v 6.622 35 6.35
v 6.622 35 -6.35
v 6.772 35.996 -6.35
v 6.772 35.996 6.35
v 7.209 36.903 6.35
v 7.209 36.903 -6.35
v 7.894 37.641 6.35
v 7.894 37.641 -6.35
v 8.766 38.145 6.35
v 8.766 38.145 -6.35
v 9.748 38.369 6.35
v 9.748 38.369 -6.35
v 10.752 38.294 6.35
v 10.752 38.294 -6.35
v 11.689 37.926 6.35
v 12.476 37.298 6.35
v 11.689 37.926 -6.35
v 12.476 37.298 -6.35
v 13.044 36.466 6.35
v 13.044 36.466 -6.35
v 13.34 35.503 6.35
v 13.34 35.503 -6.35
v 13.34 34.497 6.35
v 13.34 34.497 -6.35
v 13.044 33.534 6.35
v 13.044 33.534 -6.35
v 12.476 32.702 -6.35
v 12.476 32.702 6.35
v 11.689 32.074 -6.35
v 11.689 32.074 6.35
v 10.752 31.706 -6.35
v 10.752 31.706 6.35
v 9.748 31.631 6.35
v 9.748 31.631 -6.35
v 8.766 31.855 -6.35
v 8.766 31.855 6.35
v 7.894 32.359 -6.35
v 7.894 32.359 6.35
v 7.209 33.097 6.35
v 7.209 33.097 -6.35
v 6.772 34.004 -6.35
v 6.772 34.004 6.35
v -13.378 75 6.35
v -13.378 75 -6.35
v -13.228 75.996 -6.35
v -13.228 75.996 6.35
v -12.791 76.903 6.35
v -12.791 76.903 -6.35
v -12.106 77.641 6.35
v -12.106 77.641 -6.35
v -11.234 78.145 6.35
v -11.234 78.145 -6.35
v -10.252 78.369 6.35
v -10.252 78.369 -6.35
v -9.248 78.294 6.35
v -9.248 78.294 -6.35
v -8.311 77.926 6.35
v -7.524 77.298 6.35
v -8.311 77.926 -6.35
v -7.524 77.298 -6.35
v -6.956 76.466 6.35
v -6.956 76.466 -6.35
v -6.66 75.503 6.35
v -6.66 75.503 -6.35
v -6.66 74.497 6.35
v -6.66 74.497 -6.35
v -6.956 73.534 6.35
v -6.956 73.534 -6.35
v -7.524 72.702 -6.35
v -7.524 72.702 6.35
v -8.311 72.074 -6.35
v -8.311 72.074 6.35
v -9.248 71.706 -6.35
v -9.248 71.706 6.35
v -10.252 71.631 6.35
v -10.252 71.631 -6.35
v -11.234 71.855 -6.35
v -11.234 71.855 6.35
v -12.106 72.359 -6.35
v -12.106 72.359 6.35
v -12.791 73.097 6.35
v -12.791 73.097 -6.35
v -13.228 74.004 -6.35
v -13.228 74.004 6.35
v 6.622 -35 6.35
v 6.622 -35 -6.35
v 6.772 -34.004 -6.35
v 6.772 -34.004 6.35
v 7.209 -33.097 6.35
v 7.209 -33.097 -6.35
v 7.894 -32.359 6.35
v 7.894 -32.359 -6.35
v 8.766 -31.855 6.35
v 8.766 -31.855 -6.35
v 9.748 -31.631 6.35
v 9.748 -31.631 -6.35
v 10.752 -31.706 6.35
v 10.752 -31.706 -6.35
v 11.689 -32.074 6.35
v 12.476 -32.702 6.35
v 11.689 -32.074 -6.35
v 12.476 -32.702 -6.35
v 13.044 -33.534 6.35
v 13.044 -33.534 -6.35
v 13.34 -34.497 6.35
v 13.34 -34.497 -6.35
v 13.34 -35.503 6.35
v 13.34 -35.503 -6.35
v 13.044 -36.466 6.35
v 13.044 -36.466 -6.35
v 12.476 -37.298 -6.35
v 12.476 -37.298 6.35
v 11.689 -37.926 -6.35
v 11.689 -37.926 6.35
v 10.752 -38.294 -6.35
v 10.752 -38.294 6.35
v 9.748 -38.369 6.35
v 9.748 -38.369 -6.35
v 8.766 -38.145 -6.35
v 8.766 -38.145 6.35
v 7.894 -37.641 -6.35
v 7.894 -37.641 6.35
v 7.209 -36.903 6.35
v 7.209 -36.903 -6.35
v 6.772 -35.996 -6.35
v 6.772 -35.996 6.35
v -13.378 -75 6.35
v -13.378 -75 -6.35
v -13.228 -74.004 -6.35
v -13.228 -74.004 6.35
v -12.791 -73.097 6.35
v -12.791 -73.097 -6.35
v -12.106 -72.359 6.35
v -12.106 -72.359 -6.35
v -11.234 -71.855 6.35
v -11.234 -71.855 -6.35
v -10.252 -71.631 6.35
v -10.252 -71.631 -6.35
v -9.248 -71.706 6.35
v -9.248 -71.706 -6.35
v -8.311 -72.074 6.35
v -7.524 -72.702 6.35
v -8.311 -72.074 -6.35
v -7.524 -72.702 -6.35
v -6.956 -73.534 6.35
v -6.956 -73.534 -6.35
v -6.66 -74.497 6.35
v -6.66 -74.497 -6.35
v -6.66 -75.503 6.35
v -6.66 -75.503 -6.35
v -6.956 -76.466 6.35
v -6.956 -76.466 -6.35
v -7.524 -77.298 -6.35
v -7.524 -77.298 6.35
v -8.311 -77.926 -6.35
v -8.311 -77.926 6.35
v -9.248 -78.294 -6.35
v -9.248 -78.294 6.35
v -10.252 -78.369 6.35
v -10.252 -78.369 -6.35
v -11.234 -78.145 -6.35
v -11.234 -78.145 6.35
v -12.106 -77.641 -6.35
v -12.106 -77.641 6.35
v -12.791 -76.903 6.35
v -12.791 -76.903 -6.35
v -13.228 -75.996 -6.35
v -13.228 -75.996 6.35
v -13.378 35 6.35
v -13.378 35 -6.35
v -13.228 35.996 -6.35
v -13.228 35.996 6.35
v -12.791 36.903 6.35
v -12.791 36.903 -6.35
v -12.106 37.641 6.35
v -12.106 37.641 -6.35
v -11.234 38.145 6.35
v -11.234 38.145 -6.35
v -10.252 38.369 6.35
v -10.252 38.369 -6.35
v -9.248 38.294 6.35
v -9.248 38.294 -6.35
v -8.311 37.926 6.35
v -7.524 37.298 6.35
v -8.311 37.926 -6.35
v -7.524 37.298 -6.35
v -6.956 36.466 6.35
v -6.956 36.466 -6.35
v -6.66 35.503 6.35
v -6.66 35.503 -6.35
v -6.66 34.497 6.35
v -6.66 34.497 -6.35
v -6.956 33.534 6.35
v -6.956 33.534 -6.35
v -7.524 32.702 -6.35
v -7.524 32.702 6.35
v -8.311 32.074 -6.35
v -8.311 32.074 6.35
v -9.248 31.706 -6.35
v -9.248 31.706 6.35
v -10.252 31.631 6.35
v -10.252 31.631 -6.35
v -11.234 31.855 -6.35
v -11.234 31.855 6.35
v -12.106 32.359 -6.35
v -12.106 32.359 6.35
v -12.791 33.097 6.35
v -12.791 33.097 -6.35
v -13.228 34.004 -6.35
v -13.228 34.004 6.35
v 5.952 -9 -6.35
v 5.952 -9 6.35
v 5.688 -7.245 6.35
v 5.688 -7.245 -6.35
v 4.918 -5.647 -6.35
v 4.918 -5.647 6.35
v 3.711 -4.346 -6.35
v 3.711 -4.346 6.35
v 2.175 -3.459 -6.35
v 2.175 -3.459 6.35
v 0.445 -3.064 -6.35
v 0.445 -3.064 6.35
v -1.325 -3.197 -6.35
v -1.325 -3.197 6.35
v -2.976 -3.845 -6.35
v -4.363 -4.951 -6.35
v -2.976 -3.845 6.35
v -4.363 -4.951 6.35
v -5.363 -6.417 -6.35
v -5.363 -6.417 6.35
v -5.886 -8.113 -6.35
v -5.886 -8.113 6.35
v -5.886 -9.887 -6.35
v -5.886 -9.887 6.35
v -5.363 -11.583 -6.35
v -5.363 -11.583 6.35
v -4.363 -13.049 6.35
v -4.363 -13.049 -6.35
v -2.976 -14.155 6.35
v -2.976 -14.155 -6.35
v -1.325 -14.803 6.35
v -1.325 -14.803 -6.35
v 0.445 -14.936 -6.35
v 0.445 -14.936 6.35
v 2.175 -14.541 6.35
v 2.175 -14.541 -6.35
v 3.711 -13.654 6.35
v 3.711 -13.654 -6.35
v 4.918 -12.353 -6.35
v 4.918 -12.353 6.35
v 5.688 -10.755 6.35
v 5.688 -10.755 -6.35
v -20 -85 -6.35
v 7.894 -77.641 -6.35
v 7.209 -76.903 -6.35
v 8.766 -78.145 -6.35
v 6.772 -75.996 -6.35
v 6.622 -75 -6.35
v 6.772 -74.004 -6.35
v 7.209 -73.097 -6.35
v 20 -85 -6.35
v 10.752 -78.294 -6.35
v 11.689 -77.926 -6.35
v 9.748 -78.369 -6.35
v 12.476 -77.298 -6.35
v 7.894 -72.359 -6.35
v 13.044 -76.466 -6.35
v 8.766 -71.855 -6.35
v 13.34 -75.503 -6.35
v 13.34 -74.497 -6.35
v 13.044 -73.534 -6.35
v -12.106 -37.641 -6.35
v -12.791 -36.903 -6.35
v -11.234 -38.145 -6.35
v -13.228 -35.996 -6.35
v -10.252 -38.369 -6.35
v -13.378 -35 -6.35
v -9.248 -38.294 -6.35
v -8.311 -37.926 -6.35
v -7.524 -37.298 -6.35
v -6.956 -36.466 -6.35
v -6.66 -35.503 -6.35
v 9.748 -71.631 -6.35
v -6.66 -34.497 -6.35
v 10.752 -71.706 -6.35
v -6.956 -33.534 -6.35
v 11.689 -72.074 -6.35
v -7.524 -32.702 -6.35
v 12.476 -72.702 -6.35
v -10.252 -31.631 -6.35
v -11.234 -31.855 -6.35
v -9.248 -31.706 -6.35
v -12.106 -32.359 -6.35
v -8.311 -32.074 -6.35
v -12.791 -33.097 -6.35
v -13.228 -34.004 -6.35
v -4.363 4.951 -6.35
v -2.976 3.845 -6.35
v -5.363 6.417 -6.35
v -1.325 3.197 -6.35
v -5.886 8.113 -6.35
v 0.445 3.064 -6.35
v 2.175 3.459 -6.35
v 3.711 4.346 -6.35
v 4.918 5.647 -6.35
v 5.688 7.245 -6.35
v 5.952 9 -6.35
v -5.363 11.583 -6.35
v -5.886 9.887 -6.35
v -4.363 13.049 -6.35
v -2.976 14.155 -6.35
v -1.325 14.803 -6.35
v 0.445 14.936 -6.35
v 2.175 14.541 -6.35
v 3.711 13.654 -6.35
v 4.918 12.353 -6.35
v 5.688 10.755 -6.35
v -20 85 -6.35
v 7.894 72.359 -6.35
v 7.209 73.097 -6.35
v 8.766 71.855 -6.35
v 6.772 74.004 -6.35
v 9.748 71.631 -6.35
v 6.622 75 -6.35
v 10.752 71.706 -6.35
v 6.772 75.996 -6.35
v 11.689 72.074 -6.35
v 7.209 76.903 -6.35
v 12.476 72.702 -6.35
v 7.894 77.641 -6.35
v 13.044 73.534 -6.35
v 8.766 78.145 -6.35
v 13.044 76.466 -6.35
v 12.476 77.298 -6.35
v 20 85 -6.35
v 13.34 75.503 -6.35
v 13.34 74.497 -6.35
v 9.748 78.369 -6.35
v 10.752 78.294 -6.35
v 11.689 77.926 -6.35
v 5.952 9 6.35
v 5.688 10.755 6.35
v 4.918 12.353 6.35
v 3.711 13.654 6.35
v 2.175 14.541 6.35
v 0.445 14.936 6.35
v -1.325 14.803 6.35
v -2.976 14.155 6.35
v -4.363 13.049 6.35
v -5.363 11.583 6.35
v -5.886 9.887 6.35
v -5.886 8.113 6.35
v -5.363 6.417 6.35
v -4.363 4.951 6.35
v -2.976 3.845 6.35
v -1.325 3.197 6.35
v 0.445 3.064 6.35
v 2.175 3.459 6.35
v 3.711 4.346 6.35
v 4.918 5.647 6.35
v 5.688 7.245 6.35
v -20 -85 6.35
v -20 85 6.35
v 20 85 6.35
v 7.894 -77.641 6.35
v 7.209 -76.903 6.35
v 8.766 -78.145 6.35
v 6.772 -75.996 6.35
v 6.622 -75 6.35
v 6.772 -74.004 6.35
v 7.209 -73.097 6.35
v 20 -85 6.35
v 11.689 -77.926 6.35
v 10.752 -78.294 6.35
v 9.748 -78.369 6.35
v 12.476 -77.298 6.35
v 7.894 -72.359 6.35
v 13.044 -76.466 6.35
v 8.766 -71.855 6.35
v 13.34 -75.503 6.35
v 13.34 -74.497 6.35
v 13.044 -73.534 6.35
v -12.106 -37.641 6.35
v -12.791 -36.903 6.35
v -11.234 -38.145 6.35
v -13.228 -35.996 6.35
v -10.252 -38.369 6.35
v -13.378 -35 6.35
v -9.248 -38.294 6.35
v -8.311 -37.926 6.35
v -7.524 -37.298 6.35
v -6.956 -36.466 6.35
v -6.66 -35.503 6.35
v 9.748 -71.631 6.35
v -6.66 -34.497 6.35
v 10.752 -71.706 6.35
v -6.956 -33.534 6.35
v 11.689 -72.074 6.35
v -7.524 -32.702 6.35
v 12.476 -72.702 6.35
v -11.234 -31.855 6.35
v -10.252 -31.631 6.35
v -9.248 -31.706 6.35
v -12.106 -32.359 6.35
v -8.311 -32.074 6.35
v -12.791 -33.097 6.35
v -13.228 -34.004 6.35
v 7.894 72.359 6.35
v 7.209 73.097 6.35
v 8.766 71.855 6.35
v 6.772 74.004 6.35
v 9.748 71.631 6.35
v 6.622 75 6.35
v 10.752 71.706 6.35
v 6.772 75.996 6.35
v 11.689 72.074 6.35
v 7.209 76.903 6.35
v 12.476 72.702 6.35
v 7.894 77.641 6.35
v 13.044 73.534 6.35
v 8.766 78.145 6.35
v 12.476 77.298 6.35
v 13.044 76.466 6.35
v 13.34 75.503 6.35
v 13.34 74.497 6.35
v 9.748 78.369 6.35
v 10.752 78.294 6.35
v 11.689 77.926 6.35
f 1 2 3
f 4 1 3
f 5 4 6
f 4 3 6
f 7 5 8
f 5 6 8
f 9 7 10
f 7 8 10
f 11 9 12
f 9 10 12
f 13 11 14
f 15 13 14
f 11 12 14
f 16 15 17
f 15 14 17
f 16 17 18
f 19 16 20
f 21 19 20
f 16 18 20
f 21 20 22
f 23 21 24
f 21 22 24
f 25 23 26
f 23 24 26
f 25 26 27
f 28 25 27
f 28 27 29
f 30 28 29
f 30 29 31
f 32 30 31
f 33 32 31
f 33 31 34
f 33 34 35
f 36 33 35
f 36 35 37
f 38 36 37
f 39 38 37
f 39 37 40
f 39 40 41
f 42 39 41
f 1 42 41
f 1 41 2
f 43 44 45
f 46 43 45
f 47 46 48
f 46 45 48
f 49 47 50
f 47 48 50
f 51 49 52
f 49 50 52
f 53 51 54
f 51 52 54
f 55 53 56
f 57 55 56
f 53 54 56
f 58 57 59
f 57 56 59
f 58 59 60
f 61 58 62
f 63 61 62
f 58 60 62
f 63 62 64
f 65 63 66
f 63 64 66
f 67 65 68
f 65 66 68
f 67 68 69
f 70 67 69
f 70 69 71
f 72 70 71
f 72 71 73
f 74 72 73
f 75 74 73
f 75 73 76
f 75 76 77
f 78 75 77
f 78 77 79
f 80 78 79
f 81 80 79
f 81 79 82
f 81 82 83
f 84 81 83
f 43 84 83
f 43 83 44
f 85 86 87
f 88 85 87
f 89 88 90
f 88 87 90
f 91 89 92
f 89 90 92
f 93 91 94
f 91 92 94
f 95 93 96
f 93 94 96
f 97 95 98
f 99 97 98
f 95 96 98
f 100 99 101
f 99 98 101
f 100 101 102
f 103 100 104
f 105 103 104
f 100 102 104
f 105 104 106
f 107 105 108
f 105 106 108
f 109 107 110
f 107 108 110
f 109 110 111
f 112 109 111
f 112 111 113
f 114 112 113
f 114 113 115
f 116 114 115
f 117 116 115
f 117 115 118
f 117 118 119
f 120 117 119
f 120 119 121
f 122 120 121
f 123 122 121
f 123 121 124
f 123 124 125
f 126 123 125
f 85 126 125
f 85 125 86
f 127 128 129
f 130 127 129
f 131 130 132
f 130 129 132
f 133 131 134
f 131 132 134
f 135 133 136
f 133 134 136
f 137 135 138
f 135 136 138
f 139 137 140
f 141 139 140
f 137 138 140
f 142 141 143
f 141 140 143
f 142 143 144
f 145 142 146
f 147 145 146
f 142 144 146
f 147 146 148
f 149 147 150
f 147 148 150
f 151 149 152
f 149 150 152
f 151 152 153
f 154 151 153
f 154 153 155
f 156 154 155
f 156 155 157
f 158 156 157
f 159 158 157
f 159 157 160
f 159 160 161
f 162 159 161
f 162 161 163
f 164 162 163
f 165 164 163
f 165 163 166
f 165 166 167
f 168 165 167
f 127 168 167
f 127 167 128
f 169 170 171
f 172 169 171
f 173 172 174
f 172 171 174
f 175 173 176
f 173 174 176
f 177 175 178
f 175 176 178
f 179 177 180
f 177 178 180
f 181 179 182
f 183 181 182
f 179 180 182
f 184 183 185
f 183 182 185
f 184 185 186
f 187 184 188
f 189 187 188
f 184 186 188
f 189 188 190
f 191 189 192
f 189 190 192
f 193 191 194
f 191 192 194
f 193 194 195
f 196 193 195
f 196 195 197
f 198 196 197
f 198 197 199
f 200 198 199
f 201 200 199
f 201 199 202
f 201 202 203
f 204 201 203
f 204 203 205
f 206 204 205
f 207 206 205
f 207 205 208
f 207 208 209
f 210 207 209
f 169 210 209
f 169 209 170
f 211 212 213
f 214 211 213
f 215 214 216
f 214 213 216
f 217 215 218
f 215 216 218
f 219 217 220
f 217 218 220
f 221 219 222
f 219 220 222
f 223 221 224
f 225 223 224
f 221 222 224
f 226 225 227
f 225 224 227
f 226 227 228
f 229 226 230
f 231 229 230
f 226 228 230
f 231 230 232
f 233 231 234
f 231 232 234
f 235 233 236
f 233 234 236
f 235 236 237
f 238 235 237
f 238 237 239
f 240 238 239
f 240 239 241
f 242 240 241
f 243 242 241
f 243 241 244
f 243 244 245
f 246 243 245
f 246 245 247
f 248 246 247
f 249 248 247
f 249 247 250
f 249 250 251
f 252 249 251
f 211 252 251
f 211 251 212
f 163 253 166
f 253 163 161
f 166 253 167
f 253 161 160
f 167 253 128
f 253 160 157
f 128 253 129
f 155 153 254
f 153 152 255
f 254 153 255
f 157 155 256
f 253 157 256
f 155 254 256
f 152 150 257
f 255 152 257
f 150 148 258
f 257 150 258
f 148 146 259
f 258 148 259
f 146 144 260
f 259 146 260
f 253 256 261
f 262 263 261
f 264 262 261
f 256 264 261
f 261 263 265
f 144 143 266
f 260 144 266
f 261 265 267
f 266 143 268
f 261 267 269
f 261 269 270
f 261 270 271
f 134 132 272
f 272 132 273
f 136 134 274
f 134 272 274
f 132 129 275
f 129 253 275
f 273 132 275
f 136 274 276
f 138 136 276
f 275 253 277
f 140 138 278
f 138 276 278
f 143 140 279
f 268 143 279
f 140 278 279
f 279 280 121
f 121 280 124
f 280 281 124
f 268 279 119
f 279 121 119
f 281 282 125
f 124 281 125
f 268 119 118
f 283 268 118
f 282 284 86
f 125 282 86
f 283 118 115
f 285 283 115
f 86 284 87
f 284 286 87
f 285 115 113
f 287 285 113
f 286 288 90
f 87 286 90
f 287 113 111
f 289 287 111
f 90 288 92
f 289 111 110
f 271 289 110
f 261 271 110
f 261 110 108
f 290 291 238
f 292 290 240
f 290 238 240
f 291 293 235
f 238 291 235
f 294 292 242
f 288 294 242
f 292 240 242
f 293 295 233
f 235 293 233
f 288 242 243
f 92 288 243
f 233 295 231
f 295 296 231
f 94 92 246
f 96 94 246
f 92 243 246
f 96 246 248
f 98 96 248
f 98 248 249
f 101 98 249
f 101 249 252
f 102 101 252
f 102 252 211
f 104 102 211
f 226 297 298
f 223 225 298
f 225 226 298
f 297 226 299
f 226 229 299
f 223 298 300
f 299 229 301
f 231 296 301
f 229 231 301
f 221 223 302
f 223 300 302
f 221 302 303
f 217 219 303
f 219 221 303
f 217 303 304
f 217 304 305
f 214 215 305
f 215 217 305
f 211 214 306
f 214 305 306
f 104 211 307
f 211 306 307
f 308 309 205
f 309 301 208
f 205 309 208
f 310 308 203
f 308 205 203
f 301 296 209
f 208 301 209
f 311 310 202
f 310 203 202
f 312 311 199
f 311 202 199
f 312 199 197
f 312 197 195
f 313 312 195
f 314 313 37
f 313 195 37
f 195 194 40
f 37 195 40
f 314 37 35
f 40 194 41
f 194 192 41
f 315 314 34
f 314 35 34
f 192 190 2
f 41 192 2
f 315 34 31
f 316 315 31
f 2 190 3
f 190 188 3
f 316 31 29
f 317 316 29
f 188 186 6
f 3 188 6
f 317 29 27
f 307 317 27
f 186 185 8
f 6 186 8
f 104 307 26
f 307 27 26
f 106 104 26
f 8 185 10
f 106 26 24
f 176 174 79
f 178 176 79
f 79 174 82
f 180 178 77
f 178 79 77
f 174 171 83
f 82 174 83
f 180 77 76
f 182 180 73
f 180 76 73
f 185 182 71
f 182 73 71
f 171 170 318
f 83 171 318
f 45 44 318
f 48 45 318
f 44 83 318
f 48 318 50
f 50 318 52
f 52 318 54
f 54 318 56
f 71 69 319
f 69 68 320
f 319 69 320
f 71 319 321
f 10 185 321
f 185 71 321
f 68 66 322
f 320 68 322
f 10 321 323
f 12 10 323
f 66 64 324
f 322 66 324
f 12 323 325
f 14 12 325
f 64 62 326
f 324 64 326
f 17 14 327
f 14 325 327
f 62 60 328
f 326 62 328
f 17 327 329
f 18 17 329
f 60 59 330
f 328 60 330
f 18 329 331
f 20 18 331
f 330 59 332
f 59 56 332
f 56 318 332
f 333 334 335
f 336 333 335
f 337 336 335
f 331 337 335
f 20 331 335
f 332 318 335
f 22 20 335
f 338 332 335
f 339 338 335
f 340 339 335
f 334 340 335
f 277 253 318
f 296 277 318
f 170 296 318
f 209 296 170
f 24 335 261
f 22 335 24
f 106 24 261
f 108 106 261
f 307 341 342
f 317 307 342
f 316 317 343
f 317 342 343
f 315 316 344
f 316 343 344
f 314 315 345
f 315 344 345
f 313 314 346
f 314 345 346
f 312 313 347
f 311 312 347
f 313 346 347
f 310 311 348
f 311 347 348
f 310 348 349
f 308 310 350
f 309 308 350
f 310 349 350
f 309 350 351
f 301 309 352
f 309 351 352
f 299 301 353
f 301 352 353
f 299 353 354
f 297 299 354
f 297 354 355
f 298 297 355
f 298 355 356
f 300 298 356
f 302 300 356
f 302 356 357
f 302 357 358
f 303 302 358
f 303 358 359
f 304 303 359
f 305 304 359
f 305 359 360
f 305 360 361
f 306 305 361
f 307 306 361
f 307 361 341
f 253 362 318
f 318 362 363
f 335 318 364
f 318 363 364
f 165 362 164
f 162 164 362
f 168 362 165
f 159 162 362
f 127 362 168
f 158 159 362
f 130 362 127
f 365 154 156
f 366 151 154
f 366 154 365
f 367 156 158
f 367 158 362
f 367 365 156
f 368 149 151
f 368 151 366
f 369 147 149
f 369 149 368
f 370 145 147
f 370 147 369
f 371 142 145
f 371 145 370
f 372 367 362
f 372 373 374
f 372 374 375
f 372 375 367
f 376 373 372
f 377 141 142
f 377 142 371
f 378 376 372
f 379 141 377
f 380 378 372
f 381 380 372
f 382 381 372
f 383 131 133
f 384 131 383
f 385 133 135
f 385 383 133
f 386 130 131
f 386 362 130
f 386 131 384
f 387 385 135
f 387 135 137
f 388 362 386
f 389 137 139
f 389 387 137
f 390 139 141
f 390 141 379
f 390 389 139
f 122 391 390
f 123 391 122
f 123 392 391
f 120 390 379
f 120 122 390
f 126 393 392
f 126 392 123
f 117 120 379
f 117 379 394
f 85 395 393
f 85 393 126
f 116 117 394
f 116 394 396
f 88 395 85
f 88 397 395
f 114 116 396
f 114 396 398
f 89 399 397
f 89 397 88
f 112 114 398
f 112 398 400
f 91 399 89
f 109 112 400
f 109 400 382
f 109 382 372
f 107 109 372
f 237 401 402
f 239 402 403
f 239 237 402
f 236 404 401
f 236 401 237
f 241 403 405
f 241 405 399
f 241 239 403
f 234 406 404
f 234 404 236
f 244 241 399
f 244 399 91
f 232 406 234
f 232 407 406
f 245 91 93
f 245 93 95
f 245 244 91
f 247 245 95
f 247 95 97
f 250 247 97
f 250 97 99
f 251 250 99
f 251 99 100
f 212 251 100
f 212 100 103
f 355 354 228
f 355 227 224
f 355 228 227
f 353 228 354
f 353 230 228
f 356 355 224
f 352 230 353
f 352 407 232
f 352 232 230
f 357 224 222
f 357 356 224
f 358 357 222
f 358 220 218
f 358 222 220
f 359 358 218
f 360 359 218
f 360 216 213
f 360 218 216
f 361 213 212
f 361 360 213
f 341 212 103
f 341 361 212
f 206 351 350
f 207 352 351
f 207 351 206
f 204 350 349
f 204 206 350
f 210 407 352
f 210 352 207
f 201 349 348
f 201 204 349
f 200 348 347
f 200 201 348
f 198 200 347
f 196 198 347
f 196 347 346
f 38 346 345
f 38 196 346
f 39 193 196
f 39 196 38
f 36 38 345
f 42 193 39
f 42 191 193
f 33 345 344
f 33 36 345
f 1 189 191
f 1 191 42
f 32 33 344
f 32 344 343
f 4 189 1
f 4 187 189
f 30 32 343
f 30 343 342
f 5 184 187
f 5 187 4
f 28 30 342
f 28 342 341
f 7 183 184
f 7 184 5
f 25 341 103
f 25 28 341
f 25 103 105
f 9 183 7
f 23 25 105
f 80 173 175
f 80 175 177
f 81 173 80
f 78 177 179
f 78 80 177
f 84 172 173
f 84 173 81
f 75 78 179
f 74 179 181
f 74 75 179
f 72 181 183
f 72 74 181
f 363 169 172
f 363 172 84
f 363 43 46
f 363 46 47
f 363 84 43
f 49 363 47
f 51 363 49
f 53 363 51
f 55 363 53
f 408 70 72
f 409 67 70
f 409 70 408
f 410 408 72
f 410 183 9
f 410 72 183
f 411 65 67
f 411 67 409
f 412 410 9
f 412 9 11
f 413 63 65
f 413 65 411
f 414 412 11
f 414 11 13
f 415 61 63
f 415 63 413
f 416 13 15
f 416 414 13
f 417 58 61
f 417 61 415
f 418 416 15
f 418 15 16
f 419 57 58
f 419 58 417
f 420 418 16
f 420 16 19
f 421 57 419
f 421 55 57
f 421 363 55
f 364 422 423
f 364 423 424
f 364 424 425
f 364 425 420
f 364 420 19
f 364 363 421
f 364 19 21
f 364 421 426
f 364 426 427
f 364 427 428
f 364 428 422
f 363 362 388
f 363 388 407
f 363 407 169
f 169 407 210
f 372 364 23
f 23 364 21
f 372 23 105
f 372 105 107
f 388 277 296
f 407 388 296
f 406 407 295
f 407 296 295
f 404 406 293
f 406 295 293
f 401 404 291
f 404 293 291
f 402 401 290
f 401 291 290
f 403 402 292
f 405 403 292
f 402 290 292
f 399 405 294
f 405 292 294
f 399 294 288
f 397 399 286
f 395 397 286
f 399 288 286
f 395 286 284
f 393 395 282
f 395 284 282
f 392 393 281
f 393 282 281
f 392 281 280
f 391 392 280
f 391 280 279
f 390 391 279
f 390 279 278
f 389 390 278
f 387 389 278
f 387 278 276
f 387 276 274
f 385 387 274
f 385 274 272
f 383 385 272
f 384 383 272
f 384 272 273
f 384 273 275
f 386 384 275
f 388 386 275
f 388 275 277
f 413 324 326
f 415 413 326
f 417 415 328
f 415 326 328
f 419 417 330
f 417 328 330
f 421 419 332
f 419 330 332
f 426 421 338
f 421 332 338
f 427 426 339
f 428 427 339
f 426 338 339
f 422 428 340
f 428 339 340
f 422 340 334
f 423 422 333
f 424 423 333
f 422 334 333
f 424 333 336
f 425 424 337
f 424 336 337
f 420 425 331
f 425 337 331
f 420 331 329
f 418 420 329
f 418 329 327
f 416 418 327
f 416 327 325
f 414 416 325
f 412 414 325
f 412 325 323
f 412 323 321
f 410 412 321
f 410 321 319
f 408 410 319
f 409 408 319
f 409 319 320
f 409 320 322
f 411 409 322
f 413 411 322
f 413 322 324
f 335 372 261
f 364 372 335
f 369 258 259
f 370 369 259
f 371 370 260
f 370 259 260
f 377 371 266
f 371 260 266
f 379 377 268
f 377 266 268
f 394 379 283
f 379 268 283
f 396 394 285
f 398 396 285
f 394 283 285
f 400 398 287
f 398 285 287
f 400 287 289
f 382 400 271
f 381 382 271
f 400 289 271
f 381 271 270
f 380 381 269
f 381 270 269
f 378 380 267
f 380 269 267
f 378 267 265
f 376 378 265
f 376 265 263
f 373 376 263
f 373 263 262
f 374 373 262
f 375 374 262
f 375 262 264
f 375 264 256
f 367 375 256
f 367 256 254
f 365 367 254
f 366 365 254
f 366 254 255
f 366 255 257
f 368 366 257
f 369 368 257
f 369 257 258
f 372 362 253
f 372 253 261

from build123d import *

# Parameters (mm, degrees)
CROQUIS1_W                     = 40
CROQUIS1_H                     = 170
SALIENTE_EXTRUIR1_DEPTH        = 6.35
TALADRO_DE_MARGEN_PARA_1_41_D  = 6.7564
TALADRO_DE_MARGEN_PARA_7_161_D = 11.90498


with BuildPart() as part:
    # Croquis1 → Saliente-Extruir1 (new, symmetric)
    with BuildSketch(Plane.XY):
        Rectangle(CROQUIS1_W, CROQUIS1_H)
    extrude(amount=SALIENTE_EXTRUIR1_DEPTH, both=True)

    # Taladro de margen para 1/41 (through all)
    with Locations(Plane.XY.offset(6.35)):
        with Locations((10, 75), (10, 35), (-10, 35), (-10, 75), (-10, -75), (-10, -35), (10, -35), (10, -75)):
            Hole(TALADRO_DE_MARGEN_PARA_1_41_D / 2)

    # Taladro de margen para 7/161 (through all)
    with Locations(Plane(origin=(0, 0, -6.35), x_dir=(-1, 0, 0), z_dir=(0, 0, -1))):
        with Locations((0, -9), (0, 9)):
            Hole(TALADRO_DE_MARGEN_PARA_7_161_D / 2)


solid = part.part
